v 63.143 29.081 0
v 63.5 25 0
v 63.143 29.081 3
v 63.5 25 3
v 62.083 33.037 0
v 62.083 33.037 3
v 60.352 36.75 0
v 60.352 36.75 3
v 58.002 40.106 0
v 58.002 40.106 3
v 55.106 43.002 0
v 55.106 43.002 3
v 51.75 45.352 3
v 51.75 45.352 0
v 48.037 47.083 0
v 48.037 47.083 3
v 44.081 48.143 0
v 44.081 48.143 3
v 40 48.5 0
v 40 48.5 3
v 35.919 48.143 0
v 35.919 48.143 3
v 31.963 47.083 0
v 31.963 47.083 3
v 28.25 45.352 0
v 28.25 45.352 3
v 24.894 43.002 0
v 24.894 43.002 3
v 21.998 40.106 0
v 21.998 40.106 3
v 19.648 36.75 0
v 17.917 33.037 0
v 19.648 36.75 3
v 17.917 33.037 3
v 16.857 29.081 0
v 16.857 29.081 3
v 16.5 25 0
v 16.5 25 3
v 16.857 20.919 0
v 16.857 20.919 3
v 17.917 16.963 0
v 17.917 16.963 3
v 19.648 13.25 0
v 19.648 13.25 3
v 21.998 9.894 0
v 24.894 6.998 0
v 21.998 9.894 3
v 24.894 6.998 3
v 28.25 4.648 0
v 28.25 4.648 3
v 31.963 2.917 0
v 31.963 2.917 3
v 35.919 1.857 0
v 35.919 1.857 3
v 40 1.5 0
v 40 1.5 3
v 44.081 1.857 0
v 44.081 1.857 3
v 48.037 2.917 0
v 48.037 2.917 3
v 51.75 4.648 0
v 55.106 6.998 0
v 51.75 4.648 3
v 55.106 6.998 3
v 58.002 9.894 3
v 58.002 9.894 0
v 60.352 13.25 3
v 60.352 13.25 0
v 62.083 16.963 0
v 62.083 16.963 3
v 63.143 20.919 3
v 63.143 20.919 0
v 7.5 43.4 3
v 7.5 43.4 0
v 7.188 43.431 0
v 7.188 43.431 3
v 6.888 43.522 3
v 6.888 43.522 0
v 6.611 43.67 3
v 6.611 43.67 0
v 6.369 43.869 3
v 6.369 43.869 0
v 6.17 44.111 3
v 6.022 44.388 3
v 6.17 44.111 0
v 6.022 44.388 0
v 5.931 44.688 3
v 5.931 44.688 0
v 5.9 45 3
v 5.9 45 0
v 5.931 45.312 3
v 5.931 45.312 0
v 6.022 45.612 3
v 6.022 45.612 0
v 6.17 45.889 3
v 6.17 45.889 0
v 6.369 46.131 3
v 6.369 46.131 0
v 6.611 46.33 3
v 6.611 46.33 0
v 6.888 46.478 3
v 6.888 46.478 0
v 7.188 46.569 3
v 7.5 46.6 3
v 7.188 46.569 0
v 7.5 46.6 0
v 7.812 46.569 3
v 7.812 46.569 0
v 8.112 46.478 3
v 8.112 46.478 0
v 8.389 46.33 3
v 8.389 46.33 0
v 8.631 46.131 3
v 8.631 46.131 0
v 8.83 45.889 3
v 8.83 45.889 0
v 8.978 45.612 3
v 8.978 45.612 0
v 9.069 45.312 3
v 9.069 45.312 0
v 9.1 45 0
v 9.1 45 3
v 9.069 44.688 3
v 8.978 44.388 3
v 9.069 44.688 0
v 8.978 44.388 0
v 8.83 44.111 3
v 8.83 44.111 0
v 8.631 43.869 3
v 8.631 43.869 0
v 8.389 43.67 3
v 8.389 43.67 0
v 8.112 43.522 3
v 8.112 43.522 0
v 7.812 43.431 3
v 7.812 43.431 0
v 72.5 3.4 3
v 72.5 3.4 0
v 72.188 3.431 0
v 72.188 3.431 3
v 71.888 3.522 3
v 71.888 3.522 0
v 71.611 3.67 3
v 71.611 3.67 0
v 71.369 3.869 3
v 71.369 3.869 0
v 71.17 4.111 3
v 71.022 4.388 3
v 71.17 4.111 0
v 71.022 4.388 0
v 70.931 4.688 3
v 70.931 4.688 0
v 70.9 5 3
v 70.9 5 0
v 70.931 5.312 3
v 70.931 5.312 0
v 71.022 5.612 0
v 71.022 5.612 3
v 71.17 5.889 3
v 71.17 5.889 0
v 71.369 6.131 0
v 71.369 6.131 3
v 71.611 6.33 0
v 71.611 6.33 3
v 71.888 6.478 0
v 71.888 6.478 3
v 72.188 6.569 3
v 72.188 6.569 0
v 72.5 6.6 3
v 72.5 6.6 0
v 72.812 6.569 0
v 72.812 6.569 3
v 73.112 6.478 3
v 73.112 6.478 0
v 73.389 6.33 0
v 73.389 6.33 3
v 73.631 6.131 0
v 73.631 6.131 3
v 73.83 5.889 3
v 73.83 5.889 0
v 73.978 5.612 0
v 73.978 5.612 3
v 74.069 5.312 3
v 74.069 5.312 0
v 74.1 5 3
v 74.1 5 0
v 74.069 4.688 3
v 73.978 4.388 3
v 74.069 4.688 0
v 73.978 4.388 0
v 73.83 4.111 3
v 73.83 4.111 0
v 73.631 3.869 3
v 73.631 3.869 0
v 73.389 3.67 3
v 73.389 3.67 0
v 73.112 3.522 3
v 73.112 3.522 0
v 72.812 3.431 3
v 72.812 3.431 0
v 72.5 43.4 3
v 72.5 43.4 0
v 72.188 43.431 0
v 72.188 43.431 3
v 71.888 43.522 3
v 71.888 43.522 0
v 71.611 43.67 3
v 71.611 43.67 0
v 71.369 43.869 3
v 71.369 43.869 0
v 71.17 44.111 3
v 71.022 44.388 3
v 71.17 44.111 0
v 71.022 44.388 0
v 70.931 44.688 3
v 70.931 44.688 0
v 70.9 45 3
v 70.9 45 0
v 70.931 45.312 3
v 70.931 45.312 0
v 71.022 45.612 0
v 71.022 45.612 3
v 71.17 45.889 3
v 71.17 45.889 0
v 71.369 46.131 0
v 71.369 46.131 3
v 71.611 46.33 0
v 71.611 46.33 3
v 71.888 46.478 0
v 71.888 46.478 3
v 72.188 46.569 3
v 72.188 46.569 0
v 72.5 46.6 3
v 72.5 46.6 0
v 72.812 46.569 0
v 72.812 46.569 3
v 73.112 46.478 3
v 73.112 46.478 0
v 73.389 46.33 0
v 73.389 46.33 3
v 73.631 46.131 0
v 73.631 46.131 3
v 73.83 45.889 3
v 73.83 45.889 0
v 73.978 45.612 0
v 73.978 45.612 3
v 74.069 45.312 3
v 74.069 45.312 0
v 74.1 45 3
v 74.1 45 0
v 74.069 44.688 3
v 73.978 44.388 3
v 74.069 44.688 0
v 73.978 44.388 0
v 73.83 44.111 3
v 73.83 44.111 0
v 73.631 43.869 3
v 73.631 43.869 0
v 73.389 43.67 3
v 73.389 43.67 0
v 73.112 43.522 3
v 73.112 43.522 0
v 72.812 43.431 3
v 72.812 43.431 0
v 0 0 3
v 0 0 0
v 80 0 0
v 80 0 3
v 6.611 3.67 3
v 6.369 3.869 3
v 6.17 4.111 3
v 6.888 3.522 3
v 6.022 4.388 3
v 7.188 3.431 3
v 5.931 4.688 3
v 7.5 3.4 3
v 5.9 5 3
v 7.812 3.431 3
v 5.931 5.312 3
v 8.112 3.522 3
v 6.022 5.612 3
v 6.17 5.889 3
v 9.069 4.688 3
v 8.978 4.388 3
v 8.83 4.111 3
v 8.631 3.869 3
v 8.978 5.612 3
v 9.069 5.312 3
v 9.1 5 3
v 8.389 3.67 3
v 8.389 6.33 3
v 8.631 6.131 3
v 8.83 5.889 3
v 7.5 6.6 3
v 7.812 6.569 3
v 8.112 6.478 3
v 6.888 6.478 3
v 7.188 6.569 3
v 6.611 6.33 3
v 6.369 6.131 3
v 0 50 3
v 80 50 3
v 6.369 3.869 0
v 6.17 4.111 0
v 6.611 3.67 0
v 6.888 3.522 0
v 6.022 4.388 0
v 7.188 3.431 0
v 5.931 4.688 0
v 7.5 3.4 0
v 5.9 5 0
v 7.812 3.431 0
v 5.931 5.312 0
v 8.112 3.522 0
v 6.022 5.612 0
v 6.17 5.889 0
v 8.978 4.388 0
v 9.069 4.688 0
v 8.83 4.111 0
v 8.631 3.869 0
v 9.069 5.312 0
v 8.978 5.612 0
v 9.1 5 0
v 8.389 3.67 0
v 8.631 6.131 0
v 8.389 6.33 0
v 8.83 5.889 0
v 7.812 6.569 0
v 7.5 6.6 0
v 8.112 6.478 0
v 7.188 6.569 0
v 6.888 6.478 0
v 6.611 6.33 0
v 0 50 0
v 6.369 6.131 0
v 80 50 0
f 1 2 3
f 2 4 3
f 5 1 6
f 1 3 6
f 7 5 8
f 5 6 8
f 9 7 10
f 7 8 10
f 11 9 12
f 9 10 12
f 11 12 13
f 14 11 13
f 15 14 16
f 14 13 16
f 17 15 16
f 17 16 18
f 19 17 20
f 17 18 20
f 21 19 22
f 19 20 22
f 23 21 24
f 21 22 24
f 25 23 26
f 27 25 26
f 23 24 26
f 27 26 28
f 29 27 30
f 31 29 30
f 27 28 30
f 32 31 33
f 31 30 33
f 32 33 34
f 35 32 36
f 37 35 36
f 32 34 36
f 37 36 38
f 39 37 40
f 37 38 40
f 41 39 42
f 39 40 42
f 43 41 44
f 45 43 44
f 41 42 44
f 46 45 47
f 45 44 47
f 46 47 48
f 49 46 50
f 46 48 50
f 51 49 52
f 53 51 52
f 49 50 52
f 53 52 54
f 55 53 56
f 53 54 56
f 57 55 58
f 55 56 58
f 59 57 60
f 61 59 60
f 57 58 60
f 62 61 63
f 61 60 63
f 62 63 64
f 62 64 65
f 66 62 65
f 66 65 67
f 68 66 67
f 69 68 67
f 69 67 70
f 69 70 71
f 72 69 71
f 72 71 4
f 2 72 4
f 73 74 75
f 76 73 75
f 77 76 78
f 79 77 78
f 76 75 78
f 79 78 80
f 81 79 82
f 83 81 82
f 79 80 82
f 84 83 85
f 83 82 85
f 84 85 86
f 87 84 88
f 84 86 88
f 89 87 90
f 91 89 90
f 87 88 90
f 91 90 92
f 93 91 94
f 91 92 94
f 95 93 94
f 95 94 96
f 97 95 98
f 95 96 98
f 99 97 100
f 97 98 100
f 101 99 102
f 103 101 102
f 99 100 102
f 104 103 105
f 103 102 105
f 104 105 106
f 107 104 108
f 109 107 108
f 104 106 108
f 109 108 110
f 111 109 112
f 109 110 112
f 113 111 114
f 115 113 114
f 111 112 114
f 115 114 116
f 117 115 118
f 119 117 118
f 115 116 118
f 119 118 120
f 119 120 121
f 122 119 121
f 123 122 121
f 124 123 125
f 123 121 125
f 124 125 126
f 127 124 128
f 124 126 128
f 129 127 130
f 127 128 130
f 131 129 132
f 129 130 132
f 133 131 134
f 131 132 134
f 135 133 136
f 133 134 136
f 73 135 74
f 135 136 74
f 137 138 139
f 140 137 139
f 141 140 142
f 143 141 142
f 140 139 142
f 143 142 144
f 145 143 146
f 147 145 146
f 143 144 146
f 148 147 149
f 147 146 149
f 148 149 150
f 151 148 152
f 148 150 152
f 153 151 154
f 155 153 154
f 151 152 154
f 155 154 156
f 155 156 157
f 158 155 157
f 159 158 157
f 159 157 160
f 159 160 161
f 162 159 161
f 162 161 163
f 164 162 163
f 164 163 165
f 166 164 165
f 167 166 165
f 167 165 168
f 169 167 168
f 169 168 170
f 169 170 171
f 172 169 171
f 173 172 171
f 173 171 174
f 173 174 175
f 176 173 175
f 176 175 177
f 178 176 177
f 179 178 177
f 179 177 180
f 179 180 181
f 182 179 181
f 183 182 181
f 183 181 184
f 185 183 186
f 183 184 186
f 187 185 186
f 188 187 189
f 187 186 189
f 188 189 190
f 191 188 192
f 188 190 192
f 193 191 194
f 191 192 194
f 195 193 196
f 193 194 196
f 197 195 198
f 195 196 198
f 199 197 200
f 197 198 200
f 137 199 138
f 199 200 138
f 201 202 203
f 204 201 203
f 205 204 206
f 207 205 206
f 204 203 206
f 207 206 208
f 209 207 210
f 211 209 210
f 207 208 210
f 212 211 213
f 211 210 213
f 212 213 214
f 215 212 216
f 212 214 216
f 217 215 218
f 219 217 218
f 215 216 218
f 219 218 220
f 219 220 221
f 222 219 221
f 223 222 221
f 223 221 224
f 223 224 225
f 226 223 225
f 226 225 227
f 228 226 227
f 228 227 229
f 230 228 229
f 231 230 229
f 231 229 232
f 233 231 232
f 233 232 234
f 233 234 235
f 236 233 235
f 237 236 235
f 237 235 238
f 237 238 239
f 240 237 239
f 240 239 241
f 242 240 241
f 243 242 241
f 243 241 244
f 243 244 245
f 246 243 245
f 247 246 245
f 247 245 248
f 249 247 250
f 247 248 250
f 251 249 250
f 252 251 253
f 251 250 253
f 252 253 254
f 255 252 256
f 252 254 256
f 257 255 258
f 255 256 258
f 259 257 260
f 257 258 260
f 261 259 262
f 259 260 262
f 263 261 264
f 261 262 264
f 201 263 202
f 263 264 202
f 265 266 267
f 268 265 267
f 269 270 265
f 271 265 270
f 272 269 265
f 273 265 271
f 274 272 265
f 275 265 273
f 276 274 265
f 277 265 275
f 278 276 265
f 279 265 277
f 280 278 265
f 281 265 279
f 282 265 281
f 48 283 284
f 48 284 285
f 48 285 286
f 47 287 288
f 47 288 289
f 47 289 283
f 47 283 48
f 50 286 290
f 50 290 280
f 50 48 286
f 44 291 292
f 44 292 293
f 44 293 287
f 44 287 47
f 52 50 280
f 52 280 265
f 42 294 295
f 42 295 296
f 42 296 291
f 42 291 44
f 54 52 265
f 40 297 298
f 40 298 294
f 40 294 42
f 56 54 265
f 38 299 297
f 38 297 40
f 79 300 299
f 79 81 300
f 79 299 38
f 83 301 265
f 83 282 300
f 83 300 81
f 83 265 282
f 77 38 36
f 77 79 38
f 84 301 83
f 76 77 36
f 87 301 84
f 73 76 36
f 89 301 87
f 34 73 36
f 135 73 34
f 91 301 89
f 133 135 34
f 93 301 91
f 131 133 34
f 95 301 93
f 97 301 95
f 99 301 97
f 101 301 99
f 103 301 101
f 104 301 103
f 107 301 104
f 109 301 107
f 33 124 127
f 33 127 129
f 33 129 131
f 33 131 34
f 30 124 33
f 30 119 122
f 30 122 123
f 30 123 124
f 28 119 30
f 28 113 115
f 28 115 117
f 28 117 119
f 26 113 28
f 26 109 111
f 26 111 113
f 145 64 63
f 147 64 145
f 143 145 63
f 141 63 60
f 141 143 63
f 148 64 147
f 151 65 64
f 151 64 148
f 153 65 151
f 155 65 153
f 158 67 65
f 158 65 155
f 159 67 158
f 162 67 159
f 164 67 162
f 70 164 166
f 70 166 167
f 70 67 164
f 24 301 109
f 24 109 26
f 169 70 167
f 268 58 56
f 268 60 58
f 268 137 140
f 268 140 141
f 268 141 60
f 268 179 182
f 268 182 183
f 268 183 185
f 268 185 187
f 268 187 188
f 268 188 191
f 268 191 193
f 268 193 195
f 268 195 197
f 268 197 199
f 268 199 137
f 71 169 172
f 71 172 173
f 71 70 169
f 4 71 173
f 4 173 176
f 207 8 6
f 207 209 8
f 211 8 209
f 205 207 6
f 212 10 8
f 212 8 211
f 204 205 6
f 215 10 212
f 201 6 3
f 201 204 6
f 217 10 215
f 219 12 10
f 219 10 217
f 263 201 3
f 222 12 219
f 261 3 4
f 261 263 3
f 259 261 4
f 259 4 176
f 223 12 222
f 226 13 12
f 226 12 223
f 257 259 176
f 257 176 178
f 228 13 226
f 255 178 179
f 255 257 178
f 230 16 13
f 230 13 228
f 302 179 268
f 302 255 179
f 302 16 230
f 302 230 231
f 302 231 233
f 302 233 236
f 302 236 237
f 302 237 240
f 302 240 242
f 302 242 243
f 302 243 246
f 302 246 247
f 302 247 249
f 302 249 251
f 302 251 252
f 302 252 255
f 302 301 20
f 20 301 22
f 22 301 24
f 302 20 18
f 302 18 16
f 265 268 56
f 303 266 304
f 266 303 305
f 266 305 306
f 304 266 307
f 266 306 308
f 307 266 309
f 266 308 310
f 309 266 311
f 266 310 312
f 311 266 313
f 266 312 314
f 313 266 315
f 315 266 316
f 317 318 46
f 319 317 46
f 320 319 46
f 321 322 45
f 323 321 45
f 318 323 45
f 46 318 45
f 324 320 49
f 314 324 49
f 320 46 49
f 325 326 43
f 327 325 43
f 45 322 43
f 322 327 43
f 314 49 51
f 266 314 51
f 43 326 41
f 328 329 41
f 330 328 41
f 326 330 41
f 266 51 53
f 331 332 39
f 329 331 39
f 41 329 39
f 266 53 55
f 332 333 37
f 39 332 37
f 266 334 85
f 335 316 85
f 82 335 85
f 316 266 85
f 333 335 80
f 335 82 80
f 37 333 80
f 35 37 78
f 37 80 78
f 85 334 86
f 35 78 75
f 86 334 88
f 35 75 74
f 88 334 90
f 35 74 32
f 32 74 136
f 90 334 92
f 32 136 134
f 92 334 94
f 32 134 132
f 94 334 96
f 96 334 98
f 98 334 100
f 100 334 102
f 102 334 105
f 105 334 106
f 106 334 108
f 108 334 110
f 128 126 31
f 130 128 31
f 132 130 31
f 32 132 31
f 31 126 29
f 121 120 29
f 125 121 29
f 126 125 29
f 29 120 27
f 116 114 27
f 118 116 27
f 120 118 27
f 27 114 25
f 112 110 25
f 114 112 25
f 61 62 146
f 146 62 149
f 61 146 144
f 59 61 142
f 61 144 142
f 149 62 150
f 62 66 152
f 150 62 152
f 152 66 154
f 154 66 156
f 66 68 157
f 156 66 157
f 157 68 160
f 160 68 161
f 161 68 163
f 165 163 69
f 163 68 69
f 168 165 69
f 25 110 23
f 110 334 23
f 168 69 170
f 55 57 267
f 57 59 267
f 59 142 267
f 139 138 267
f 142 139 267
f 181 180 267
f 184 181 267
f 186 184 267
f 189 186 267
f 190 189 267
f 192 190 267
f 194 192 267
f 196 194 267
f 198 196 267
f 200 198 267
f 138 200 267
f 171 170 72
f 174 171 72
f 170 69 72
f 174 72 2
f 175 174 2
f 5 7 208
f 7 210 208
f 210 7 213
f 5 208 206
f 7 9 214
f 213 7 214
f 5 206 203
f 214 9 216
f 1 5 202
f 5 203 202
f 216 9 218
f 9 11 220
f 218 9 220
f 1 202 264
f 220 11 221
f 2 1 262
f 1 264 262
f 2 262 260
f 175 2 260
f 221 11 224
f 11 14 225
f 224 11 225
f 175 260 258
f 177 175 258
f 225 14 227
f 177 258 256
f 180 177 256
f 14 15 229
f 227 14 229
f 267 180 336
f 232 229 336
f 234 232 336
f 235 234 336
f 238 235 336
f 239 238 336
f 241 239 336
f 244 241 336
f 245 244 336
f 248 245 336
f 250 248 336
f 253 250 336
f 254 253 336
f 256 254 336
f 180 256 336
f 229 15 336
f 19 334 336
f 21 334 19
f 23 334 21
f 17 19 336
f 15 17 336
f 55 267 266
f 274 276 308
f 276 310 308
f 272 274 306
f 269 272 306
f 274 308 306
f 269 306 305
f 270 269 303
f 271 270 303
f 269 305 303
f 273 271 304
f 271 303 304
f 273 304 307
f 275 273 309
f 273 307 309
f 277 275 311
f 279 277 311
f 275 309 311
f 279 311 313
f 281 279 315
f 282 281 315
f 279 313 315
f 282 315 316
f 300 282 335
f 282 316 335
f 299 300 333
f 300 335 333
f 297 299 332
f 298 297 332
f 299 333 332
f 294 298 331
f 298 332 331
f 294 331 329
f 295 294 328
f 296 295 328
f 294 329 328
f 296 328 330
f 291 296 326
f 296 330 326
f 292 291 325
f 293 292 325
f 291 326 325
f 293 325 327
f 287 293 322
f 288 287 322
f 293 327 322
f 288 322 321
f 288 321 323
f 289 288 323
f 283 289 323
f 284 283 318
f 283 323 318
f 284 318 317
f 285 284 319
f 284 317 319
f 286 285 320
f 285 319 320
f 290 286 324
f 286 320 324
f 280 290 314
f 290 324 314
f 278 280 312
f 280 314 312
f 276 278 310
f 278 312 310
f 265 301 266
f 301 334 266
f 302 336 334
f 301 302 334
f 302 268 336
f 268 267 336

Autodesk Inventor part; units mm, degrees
ref_plane "YZ Plane" through (0, 0, 0) normal (1, 0, 0) x (0, 1, 0)
ref_plane "XZ Plane" through (0, 0, 0) normal (0, 1, 0) x (-1, 0, 0)
ref_plane "XY Plane" through (0, 0, 0) normal (0, 0, 1) x (1, 0, 0)
sketch "スケッチ1" plane through (0, 0, 0) normal (0, 0, 1) x (1, 0, 0)
  line L0 (0, 0) -> (80, 0)
  line L1 (80, 0) -> (80, 50)
  line L2 (80, 50) -> (0, 50)
  line L3 (0, 50) -> (0, 0)
  dimension "d0" = 80
  dimension "d1" = 50
extrude "押し出し1" add sketch "スケッチ1" along normal blind 3
sketch "スケッチ2" plane through (0, 0, 3) normal (0, 0, 1) x (1, 0, 0)
  circle A0 centre (40, 25) radius 23.5
  line L0 (0, 0) -> (80, 0) projected
  line L1 (0, 50) -> (0, 0) projected
  dimension "d4" = 47
  dimension "d5" = 25
  dimension "d6" = 40
extrude "押し出し2" cut sketch "スケッチ2" against normal blind 3
sketch "スケッチ3" plane through (0, 0, 3) normal (0, 0, 1) x (1, 0, 0)
  circle A0 centre (7.5, 45) radius 1.6
  line L0 (0, 50) -> (0, 0) projected
  line L1 (80, 50) -> (0, 50) projected
  circle A1 centre (7.5, 5) radius 1.6
  line L2 (0, 0) -> (80, 0) projected
  circle A2 centre (72.5, 45) radius 1.6
  line L3 (80, 0) -> (80, 50) projected
  circle A3 centre (72.5, 5) radius 1.6
  dimension "d9" = 3.2
  dimension "d10" = 7.5
  dimension "d11" = 5
  dimension "d12" = 3.2
  dimension "d13" = 5
  dimension "d14" = 3.2
  dimension "d15" = 7.5
  dimension "d16" = 5
  dimension "d17" = 3.2
  dimension "d18" = 5
  dimension "d19" = 7.5
  dimension "d20" = 7.5
hole "穴1" at (7.5, 45, 3) at (7.5, 5, 3) at (72.5, 45, 3) at (72.5, 5, 3) direction (0, 0, -1) diameter 3.2 depth 3
sketch "スケッチ4" plane through (0, 0, 3) normal (0, 0, 1) x (1, 0, 0)
  point P0 (0, 0)
equation "\"BendRadius\" = Thickness"
equation "\"BendReliefWidth\" = Thickness"
equation "\"BendReliefDepth\" = 0.5 * Thickness"
equation "\"CornerReliefSize\" = 4 * Thickness"
equation "\"MinimumRemnant\" = 2 * Thickness"
equation "\"TransitionRadius\" = BendRadius"
equation "\"JacobiRadiusSize\" = BendRadius"
equation "\"GapSize\" = Thickness"
equation "\"Thickness\" = 0.5"
properties part number "nhk31"
